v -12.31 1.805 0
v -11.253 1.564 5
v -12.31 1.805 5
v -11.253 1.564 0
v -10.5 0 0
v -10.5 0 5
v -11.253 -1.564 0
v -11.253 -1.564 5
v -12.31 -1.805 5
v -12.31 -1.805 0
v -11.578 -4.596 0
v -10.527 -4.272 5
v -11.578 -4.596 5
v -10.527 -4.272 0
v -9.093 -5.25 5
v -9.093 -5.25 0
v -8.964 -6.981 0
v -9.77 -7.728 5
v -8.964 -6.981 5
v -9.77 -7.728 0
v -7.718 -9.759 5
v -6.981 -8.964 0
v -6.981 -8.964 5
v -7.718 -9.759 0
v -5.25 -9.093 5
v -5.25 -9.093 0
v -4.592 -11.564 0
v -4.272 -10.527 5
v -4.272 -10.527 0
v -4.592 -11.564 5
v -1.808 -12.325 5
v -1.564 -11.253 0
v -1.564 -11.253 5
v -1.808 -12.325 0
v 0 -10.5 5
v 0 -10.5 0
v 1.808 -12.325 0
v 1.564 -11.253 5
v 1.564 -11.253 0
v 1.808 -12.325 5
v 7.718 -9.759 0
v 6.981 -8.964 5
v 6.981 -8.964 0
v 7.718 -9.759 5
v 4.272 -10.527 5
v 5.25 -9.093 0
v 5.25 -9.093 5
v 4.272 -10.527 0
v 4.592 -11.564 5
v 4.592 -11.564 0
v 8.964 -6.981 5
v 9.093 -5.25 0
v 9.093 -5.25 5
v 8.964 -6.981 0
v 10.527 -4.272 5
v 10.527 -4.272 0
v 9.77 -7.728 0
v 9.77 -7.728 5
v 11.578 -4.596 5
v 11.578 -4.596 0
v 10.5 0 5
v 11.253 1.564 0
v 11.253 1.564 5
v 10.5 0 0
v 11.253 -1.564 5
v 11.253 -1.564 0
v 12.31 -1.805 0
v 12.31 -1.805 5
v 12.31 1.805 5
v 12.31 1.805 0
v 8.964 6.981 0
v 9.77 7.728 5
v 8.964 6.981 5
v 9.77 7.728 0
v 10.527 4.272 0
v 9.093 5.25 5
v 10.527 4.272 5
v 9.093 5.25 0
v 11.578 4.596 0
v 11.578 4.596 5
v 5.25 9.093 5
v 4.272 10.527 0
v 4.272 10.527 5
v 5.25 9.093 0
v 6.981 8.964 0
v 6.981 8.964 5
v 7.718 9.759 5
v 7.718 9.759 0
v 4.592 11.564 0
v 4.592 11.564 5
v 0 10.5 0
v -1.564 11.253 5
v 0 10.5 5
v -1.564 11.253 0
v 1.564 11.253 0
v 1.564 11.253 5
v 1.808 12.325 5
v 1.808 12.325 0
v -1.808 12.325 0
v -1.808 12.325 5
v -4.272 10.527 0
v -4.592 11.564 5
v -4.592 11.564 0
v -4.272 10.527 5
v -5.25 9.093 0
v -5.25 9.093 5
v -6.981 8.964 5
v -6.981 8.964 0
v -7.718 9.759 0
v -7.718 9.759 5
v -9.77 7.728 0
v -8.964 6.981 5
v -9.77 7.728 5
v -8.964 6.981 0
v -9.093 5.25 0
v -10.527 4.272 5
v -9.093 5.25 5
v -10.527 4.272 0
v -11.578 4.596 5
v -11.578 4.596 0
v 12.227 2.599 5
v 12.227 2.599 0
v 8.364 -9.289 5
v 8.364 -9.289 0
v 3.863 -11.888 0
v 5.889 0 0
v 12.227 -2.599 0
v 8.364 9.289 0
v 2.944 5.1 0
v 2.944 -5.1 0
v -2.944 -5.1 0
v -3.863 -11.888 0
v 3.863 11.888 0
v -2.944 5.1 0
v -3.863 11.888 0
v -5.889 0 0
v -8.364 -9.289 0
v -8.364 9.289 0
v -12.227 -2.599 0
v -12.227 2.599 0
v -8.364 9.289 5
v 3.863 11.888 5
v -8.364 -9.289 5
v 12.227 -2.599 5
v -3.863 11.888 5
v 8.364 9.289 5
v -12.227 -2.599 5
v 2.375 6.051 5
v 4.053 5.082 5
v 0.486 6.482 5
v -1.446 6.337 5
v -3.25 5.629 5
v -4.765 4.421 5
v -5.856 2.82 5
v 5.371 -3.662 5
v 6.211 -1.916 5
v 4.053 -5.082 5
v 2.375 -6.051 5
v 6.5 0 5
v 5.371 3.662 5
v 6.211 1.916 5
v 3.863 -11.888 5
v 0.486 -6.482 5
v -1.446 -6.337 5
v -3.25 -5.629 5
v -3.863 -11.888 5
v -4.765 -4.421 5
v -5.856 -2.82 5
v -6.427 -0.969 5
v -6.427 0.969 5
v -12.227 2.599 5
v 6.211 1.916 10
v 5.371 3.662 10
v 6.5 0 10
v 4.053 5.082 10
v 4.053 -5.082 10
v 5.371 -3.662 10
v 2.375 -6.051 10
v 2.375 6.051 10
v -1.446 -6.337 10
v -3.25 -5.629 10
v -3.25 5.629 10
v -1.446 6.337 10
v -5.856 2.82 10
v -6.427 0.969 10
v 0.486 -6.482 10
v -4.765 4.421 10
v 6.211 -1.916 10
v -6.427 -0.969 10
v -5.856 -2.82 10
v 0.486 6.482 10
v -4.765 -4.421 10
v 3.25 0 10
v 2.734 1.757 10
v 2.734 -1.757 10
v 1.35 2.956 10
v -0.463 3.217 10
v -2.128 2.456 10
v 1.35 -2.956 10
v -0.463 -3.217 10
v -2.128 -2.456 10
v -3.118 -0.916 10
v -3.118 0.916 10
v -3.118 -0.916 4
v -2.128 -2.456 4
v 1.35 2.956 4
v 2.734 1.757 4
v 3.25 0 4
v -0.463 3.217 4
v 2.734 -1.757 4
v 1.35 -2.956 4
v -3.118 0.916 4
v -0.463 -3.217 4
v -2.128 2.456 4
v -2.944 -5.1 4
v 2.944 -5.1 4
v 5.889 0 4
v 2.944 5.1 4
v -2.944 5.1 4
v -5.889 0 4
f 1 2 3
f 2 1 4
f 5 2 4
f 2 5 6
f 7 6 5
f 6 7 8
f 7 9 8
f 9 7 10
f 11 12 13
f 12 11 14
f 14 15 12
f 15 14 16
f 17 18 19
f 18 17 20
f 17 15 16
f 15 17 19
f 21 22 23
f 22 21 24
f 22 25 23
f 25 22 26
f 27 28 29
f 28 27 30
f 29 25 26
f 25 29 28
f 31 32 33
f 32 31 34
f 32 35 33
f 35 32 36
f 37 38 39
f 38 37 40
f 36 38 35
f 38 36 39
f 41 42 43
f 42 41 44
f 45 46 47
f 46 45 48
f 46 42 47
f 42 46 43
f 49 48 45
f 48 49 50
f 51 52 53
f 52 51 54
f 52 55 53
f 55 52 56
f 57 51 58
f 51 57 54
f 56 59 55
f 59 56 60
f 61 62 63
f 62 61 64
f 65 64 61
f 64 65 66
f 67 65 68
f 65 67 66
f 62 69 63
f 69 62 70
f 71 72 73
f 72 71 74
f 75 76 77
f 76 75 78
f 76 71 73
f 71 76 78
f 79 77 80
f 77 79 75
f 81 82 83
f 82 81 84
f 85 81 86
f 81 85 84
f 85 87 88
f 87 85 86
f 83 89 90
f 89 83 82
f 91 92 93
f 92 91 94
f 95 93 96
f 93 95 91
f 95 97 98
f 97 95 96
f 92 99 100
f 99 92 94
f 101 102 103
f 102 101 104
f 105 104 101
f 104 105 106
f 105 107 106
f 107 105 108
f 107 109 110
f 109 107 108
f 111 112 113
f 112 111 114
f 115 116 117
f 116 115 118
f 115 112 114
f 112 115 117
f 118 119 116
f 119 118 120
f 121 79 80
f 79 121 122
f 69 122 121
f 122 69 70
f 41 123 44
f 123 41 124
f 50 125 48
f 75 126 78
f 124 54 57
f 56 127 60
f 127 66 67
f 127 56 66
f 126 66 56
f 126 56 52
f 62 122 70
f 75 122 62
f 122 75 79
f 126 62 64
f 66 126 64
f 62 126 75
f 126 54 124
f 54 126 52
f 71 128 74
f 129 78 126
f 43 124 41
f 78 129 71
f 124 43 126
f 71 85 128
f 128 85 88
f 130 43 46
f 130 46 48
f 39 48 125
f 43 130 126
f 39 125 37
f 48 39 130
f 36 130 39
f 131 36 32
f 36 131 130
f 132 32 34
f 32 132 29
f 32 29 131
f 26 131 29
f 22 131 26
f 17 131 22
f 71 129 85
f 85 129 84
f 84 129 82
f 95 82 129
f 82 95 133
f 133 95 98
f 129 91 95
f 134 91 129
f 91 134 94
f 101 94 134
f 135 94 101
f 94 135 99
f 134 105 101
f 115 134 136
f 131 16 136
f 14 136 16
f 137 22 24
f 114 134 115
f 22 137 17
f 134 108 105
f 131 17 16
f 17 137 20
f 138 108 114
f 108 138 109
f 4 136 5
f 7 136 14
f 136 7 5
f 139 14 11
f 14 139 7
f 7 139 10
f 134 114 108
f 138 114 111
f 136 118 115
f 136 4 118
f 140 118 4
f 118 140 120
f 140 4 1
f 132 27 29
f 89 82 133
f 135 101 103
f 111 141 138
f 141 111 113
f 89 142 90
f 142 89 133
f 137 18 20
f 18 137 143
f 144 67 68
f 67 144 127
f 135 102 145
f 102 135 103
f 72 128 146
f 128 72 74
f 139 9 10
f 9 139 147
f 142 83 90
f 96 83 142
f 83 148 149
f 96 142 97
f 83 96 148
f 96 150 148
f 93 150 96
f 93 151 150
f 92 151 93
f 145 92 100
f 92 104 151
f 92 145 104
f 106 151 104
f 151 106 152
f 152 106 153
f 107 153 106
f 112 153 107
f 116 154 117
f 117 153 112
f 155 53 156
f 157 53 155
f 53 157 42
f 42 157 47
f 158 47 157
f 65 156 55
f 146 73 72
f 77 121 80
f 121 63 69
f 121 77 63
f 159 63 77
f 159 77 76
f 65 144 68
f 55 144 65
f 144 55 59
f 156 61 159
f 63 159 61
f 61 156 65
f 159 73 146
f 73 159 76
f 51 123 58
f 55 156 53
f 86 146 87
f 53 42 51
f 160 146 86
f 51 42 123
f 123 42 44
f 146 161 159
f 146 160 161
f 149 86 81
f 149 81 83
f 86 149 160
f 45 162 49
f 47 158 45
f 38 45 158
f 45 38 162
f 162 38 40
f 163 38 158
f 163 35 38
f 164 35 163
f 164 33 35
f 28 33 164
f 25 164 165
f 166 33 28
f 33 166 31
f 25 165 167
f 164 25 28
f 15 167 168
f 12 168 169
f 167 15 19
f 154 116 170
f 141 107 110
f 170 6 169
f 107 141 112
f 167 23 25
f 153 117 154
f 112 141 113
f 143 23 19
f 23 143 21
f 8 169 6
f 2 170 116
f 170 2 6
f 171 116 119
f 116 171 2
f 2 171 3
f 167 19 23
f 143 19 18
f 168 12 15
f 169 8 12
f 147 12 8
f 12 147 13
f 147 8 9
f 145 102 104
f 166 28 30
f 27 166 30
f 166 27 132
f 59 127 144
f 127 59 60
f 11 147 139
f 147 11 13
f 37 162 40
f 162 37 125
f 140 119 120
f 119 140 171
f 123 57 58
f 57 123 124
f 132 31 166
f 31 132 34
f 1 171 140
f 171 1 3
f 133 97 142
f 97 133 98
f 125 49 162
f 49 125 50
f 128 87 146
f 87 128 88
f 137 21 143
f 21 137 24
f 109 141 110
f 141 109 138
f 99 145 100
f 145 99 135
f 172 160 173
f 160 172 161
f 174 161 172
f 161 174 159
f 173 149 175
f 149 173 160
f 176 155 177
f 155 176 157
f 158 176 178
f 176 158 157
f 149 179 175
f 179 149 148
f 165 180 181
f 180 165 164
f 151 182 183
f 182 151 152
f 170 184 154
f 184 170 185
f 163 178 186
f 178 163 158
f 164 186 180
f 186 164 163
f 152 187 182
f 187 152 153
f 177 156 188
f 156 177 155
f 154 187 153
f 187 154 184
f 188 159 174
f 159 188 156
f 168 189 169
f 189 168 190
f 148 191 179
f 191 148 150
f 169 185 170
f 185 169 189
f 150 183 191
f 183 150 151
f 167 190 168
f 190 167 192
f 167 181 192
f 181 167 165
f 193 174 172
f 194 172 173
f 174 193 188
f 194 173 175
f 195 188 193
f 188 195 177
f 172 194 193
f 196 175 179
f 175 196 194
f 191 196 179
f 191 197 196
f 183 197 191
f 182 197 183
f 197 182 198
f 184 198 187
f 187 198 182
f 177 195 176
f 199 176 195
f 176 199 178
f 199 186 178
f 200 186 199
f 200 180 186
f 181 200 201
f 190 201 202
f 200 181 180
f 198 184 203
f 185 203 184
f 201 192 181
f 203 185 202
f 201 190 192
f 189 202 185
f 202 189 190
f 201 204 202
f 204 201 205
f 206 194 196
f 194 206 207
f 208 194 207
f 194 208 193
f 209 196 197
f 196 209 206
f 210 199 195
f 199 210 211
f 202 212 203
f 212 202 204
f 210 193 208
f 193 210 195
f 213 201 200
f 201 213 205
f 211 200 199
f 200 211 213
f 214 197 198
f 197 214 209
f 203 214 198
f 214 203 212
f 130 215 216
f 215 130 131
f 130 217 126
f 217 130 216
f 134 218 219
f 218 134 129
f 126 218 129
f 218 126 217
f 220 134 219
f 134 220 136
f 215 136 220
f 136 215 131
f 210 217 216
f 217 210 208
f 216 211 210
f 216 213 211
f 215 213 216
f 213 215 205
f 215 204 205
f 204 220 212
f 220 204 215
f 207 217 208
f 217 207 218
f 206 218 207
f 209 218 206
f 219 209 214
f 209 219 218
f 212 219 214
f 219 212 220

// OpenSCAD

//Size of the wrench used to tightnen (mm)
WrenchSize=10.2;

//Thickness of the handle piece(mm)
HandleH=5;

//Height of the inner cylinder (mm(
InnerH=10;

//Diameter of Handle piece (mm)
HandleD=25;

//Diameter of the pass-through hole (mm)
HoleD=6.5;

//Nut trap depth (mm)
NutH=4;

//Handle decoration/grip radius (mm)
DecoR=2;

//Number of Decoration/grip bites
DecoN=12;

//Decoration offset, increase to decrease the arch of decoration (mm) (<DecoR)
DecoOS=0;

//Decoration smoothness, increase to make smoother decorations (mm)
DecoSu=0;


module Handle1(D,H,dr,dn,dos,ds){
minkowski(){
	difference(){
		cylinder(r=D/2-ds, h=H);
		for (a = [0:360/dn:360]){
	           rotate([0,0,a])
	            translate([-(D-ds)/2-dos,0,-0.5]) cylinder(r=dr+ds/2,h=H+1);
	       }
		}
	//sphere(r=ds);
	cylinder(r=ds,h=1, $fn=10);
	}
}

module Handle(D,H,dr,dn,dos,ds){

if(ds>0){
	Handle1(D,H-1,dr,dn,dos,ds);
}else{
	Handle1(D,H,dr,dn,dos,ds);
}
}

module BoltHandle(WrenchSize, HandleH, TotalH, HandleD, HoleD, NutH, DecoR, DecoN,DecoOS=0,DecoSu=0){
difference(){
	union(){
		Handle(HandleD,HandleH,DecoR,DecoN,DecoOS,DecoSu);
		cylinder(r=HoleD, h = TotalH);	
	}
	cylinder(r=HoleD/2,h=TotalH);
	cylinder(r=sqrt(3)*WrenchSize/3,h=NutH,$fn=6);

}
}


BoltHandle(WrenchSize,HandleH,InnerH,HandleD,HoleD,NutH,DecoR,DecoN,DecoOS,DecoSu);
